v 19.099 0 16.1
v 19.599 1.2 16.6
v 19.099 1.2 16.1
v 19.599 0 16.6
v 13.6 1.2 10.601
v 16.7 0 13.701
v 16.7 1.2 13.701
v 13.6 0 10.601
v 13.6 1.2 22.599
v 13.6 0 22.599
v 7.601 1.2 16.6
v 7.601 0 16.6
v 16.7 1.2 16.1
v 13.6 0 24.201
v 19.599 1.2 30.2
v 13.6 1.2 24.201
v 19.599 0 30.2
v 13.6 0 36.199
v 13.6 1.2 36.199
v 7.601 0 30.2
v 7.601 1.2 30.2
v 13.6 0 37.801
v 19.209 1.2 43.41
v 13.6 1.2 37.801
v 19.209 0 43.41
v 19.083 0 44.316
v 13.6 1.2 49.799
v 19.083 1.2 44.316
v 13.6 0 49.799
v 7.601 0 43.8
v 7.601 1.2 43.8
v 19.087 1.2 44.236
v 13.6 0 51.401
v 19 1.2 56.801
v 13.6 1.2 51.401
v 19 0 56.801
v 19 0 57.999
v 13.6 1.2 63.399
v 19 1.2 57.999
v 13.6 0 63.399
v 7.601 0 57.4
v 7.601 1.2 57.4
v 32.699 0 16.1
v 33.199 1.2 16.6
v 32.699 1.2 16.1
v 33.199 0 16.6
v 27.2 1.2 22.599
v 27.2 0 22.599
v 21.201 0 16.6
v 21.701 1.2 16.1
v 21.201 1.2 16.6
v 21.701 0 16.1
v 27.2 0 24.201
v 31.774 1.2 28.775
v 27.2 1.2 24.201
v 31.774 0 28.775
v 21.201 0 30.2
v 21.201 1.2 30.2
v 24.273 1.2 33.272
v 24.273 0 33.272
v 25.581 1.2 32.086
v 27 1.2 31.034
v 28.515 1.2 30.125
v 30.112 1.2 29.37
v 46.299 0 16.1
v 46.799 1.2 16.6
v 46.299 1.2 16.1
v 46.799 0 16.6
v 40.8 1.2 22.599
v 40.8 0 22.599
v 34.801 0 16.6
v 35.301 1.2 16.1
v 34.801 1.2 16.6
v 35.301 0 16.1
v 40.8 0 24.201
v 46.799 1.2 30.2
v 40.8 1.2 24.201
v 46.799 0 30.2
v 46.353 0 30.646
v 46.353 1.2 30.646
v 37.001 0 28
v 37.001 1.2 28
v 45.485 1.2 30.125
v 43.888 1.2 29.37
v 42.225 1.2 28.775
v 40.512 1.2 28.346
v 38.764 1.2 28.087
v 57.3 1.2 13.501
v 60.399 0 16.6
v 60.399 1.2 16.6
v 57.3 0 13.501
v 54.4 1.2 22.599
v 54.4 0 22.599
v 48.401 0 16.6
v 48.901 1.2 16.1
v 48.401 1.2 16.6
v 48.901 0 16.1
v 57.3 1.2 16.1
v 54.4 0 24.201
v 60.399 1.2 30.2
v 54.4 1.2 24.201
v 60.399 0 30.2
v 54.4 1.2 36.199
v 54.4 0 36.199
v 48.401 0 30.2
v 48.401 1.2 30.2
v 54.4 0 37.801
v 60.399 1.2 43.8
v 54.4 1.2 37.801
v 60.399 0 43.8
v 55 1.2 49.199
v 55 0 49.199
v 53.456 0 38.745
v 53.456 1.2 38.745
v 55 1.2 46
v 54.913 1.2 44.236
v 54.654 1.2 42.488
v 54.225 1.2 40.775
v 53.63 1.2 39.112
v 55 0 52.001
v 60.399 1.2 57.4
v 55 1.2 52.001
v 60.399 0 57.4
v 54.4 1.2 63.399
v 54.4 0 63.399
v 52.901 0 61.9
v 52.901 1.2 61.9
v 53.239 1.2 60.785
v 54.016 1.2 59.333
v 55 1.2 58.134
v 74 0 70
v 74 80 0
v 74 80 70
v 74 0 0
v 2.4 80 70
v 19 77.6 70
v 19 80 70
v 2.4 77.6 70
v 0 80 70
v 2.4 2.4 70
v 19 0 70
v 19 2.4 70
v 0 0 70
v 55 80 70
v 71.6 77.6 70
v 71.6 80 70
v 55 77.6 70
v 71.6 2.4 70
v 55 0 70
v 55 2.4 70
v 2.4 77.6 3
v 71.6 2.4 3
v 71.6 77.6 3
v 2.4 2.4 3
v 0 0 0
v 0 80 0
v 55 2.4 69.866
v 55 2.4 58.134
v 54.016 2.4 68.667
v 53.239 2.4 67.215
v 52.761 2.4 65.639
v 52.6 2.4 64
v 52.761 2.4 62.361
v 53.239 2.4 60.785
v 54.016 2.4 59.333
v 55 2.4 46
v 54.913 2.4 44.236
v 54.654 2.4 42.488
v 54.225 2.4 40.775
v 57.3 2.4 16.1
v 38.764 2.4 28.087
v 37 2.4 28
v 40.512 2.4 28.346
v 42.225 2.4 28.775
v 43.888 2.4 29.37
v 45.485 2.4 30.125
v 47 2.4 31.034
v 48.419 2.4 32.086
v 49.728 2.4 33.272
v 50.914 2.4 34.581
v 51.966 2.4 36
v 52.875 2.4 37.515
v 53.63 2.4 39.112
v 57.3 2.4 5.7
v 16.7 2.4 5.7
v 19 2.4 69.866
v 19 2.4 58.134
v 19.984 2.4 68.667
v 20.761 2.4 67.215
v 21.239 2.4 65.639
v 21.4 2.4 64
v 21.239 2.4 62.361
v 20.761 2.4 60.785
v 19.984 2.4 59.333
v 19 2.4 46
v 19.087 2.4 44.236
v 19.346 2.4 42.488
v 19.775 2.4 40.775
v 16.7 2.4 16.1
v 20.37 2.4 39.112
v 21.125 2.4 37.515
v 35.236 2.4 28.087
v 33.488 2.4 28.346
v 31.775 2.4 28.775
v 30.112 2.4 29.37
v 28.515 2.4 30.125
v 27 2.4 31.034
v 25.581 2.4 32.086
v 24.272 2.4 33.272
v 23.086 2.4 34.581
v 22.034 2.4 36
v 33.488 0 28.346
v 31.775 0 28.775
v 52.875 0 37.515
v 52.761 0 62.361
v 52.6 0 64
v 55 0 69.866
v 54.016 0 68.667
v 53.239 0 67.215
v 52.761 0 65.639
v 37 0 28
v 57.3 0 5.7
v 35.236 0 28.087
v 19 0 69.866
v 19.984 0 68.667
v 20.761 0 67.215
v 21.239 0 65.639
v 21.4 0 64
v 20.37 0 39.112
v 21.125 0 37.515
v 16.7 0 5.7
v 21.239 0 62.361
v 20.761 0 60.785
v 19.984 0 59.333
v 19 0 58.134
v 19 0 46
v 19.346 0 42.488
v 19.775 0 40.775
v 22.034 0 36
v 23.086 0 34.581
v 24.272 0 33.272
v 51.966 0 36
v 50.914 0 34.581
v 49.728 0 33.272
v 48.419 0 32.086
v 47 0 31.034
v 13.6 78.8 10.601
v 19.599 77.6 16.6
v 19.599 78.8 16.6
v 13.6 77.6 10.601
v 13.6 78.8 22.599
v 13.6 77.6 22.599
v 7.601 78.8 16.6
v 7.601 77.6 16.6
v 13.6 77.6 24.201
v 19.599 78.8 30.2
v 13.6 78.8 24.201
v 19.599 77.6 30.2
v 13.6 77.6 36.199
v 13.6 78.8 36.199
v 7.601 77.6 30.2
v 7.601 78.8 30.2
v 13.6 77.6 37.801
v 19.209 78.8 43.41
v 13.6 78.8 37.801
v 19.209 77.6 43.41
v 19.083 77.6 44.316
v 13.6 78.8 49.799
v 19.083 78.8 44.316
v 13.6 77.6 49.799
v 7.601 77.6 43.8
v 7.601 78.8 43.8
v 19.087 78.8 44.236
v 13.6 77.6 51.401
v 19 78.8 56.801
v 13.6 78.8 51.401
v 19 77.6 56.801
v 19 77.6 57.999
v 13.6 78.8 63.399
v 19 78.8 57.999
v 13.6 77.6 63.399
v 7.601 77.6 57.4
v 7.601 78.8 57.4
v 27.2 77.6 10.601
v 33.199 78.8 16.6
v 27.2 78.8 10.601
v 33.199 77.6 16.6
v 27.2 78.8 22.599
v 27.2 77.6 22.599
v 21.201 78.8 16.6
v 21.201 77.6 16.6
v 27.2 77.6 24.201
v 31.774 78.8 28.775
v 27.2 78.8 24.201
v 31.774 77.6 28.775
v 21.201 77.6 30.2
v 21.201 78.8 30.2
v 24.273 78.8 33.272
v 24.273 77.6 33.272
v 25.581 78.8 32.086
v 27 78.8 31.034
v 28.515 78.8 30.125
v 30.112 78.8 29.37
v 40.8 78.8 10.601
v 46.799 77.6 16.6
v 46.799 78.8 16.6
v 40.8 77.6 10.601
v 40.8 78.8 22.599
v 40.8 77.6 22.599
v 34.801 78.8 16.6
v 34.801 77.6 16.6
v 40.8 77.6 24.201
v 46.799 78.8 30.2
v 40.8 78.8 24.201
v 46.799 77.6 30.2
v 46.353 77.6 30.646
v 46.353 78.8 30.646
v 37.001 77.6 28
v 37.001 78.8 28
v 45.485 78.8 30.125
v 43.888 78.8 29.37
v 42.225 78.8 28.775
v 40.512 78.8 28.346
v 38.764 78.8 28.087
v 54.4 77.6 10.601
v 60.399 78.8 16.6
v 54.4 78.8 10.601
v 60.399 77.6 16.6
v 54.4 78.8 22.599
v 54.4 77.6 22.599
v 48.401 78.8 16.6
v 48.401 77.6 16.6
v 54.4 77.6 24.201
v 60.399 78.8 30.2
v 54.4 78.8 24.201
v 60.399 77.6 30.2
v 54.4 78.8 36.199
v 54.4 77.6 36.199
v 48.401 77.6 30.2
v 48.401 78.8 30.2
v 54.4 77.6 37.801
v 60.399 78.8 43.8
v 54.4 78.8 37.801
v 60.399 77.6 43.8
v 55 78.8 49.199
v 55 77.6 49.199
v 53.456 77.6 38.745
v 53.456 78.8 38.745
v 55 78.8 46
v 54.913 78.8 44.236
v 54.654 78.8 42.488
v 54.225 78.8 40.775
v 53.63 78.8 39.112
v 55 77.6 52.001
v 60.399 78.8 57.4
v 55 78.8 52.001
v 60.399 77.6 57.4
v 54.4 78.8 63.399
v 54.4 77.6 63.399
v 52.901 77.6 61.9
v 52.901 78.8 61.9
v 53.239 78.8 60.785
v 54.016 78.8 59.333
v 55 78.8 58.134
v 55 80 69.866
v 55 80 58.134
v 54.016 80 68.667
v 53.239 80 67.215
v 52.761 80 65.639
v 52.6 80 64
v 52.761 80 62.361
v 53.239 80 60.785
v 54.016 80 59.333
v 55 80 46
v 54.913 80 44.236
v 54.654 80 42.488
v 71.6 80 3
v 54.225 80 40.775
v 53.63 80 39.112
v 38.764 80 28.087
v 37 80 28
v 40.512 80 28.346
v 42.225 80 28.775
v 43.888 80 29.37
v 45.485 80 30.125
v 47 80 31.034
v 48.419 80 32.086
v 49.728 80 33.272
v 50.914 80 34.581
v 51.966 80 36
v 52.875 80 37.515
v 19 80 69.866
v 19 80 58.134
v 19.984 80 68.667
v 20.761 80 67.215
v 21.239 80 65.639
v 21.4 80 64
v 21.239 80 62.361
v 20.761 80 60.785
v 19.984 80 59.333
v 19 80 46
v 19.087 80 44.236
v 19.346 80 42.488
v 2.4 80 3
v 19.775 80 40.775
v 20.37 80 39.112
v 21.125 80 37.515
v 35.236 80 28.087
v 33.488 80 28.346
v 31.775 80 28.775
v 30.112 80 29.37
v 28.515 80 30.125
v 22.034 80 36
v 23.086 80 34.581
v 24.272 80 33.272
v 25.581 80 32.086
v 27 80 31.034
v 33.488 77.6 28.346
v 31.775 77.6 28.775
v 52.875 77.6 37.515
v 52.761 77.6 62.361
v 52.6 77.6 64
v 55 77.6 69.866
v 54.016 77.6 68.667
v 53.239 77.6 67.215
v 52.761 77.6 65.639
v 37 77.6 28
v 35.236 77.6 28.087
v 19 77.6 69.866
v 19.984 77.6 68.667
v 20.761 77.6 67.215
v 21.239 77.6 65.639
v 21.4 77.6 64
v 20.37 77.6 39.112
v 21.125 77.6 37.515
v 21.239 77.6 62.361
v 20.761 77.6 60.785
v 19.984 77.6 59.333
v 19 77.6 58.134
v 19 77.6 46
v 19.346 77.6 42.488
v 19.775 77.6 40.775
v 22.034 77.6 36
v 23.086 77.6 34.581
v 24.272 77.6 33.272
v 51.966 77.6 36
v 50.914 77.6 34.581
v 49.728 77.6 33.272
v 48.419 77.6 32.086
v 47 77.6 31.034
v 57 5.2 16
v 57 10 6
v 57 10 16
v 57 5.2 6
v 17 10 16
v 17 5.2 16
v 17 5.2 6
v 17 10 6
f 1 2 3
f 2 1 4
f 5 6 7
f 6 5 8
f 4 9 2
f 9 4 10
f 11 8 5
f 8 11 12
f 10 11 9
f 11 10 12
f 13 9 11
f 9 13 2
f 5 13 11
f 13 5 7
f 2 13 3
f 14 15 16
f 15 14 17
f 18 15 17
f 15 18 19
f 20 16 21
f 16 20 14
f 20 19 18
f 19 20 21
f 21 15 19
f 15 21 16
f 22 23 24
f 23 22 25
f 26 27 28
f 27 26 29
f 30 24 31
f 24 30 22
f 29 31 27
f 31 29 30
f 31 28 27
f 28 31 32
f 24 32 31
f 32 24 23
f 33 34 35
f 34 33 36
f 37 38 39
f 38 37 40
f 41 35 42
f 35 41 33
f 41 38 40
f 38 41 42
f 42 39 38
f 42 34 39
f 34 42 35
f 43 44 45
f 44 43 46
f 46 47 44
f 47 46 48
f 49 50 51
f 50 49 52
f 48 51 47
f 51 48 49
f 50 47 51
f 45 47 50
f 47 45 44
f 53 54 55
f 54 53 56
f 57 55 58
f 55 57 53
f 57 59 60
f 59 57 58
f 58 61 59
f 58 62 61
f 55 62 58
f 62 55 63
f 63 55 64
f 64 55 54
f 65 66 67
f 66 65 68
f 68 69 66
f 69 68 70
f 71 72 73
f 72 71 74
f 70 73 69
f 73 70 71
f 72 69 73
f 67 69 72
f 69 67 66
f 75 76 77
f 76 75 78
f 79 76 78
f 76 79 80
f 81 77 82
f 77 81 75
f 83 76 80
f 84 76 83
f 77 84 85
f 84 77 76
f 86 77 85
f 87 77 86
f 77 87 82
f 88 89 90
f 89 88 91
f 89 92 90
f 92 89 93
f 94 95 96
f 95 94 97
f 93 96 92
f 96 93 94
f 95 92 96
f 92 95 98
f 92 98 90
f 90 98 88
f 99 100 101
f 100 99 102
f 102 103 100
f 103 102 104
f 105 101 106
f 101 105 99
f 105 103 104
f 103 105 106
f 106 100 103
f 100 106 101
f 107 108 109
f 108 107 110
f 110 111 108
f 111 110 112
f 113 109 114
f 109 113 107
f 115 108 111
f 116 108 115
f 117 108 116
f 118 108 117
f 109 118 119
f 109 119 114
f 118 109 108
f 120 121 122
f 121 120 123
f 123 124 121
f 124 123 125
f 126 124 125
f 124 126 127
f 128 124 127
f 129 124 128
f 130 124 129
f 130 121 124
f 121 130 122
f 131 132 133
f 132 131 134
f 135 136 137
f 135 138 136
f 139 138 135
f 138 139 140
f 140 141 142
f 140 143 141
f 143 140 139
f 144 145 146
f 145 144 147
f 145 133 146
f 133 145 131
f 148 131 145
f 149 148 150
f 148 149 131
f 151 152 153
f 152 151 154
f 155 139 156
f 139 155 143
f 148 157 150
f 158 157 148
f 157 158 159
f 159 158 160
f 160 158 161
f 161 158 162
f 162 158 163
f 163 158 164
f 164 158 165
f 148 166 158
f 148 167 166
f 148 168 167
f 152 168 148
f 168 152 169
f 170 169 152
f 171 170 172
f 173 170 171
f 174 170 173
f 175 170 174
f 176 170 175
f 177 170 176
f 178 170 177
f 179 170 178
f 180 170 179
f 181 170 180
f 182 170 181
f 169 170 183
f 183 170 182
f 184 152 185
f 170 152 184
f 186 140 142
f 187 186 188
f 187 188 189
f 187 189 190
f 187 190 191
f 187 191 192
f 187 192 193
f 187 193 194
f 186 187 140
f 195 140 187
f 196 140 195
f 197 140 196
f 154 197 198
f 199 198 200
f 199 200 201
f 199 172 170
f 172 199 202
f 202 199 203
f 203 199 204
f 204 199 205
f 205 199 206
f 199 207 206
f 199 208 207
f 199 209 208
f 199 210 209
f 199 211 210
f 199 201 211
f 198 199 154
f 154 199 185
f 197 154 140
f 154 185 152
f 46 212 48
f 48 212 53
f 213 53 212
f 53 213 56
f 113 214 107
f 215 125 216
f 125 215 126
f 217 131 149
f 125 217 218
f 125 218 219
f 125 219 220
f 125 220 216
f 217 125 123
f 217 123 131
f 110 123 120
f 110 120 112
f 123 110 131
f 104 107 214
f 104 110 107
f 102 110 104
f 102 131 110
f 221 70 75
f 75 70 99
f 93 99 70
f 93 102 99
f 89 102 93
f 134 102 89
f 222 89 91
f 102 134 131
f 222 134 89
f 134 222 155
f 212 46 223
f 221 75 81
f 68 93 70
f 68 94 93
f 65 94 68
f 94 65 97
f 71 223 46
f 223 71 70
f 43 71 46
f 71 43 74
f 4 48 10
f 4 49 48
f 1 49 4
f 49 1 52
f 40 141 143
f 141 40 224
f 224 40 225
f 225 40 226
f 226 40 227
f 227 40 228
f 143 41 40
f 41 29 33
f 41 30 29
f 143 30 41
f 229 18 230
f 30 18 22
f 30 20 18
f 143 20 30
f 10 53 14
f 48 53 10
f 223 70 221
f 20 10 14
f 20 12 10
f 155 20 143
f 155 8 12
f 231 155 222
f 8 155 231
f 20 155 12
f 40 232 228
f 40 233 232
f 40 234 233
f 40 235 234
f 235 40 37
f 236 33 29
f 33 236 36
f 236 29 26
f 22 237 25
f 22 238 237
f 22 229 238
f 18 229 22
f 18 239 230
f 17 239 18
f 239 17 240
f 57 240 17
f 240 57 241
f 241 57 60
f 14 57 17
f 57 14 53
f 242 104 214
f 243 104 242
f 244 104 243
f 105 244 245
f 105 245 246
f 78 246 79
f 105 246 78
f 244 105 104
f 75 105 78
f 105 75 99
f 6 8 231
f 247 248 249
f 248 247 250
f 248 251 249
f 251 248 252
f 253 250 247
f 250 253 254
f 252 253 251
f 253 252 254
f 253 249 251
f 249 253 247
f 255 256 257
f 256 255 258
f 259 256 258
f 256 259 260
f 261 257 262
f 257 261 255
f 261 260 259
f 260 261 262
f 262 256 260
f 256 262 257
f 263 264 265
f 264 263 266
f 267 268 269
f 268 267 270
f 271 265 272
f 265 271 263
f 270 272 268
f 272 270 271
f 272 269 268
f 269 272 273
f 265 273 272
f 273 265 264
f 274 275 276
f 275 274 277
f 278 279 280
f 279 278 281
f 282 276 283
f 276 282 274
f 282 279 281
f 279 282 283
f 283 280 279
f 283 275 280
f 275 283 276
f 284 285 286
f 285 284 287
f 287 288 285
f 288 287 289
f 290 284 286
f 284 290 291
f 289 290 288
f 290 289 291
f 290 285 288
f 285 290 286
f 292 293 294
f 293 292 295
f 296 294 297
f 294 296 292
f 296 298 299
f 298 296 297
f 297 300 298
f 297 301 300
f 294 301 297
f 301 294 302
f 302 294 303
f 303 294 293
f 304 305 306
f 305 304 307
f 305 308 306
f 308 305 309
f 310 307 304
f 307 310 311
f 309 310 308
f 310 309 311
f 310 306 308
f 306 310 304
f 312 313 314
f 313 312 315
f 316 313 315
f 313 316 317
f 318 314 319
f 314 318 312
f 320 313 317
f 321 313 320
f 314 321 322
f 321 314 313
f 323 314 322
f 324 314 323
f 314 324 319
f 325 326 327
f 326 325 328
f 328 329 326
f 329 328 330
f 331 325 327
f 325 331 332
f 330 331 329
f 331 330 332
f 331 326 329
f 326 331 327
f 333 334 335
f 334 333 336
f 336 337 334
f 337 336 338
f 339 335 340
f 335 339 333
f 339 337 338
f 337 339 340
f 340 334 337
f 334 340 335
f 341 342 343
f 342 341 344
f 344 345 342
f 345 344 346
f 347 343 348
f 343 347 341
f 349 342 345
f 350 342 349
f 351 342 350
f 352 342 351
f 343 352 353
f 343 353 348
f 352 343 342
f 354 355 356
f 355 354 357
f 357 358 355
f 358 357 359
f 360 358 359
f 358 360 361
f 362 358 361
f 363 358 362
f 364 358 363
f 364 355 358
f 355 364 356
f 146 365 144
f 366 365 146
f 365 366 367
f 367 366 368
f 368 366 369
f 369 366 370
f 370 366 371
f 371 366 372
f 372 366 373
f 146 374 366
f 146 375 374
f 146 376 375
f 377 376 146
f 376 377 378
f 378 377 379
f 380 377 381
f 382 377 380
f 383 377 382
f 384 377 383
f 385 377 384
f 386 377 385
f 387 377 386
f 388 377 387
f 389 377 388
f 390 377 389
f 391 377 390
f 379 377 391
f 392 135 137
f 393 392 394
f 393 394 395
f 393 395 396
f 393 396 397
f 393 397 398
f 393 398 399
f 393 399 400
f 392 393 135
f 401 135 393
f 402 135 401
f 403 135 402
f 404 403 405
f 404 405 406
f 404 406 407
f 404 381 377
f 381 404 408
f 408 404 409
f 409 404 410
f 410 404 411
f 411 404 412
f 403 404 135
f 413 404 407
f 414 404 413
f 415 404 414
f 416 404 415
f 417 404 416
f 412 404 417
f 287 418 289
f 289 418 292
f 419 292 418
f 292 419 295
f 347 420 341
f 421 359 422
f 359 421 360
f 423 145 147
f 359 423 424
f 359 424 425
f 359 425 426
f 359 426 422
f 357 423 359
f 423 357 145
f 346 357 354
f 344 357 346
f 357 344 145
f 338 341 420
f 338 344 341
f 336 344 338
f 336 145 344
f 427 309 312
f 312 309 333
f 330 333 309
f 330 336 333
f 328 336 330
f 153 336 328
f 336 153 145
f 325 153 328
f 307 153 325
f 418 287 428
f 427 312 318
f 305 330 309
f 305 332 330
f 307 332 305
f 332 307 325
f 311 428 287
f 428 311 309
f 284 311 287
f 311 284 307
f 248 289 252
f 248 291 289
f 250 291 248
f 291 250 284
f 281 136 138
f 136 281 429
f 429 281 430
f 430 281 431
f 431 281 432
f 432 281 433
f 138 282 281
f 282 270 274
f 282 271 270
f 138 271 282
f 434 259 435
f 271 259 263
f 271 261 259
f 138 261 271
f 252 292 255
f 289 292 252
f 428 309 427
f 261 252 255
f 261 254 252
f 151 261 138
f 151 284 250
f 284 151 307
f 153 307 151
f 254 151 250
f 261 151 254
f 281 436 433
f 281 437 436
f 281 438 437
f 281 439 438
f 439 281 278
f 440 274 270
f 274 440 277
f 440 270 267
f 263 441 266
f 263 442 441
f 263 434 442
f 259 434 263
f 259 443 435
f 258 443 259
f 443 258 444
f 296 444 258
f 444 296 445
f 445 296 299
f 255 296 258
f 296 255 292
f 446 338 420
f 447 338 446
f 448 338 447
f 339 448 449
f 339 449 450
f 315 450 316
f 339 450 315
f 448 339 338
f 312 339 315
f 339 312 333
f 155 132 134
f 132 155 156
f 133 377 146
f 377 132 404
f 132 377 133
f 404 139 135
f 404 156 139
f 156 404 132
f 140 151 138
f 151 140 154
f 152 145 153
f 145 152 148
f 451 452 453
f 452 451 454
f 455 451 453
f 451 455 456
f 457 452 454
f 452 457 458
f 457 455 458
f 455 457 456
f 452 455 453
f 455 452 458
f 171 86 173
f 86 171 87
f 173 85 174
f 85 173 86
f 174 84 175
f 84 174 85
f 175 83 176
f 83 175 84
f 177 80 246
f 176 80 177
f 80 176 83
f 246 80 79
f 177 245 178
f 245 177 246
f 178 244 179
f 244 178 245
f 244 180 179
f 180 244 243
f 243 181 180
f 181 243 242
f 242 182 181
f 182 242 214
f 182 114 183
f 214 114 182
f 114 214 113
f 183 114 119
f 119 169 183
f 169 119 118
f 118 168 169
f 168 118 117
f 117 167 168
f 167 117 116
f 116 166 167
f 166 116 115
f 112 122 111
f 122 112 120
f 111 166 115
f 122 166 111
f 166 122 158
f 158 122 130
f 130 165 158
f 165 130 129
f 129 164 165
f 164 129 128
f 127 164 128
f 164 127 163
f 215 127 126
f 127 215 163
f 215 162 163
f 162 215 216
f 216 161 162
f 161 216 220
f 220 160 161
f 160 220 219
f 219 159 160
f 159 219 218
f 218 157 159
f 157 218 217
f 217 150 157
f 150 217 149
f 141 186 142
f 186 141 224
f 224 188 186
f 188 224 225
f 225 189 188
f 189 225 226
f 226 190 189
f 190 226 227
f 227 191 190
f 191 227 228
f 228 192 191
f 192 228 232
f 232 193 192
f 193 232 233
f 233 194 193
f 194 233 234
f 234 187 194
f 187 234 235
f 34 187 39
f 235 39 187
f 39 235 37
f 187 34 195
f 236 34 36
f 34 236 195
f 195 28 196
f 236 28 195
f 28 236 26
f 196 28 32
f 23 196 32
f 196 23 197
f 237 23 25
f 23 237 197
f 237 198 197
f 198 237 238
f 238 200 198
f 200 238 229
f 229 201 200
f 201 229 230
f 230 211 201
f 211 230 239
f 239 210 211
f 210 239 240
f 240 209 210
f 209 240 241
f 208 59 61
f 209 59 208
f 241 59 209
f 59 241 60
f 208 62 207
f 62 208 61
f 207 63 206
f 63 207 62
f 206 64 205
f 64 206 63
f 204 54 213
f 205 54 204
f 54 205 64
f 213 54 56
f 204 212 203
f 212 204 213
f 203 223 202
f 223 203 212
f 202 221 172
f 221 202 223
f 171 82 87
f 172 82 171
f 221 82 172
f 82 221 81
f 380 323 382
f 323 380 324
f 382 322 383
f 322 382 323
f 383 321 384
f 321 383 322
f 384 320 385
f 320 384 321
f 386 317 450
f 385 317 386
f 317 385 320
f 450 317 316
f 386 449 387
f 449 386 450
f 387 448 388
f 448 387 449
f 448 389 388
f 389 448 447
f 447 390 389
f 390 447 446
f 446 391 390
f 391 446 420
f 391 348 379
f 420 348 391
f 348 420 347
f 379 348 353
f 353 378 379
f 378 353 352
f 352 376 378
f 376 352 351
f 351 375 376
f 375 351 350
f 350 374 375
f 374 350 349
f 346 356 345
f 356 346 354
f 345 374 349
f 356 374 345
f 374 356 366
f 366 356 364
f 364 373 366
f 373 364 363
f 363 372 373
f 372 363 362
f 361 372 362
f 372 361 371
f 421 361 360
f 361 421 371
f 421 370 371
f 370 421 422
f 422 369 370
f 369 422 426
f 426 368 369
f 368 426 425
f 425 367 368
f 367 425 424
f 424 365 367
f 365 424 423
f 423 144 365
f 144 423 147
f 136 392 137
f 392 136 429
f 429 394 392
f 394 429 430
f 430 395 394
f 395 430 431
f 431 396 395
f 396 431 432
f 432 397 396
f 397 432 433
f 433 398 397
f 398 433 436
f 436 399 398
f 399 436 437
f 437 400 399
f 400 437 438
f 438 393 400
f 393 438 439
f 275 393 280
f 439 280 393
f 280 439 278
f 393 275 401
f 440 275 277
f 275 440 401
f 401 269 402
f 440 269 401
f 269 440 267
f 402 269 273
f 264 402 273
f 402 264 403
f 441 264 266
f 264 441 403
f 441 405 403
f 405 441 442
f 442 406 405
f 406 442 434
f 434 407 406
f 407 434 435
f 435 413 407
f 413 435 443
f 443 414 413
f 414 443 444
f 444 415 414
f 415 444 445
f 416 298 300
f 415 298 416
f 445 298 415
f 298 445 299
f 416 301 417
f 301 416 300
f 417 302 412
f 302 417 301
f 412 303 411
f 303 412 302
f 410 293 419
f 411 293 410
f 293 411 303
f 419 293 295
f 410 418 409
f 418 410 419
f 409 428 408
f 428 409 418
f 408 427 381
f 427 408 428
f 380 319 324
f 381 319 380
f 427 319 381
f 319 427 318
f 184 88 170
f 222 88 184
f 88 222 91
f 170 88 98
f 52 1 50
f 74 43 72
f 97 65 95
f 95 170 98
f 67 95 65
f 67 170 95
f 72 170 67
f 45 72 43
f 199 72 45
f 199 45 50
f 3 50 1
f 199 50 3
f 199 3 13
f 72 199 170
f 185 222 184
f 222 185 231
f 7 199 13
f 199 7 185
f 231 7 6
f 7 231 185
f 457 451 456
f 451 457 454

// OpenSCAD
// ============================================================
//  joint_test.scad — 1-cell prototype, lattice front/back
//  Print TWO: joint_test.scad (front) + joint_back.scad (back)
//  Each ~45 min, print together on same bed
// ============================================================

cw   = 74;
cd   = 80;
wh   = 70;
ow   = 2.4;
bt   = 3.0;
tt   = 5;
tl   = 40;
th   = 10;
tol  = 0.3;
lat_gap    = 12;
lat_strand = 1.6;
uc_w = 36;
uc_r = 18;
uc_dep = 42;
tc_r = 6;
tx = cw / 2;

// Lattice wall running along X
module lat_wall_x(len, ht, thick, gap, strand) {
    pitch = gap + strand;
    difference() {
        cube([len, thick, ht]);
        for (xi=[pitch:pitch:len-pitch/2], zi=[pitch:pitch:ht-pitch/2])
            translate([xi,-0.1,zi]) rotate([0,45,0])
                cube([gap*0.707,thick+0.2,gap*0.707],center=true);
    }
}

module u_profile_2d() {
    half = uc_w/2;
    difference() {
        union() {
            translate([-half, uc_r]) square([uc_w, uc_dep-uc_r]);
            translate([0, uc_r]) circle(r=uc_r, $fn=64);
        }
        translate([-half-tc_r, uc_dep-tc_r]) circle(r=tc_r*1.4, $fn=32);
        translate([ half+tc_r, uc_dep-tc_r]) circle(r=tc_r*1.4, $fn=32);
    }
}

module u_cut(wt) {
    translate([0, wt, wh-uc_dep])
        rotate([90,0,0])
            linear_extrude(wt+0.2)
                u_profile_2d();
}

module test_piece(is_front=false) {
    difference() {
        union() {
            // Base
            cube([cw, cd, bt]);
            // Front wall — lattice
            translate([0, 0, bt])
                lat_wall_x(cw, wh-bt, ow, lat_gap, lat_strand);
            // Back wall — lattice
            translate([0, cd-ow, bt])
                lat_wall_x(cw, wh-bt, ow, lat_gap, lat_strand);
            // Left wall — solid
            translate([0, 0, bt]) cube([ow, cd, wh-bt]);
            // Right wall — solid
            translate([cw-ow, 0, bt]) cube([ow, cd, wh-bt]);

            // Tongue or receiver block
            if (is_front)
                translate([tx-tl/2, cd, bt+3]) cube([tl, tt, th]);
            else
                translate([tx-tl/2, 0, bt+3]) cube([tl, tt*2, th]);
        }

        // U cutouts
        translate([cw/2, 0, 0])    u_cut(ow);
        translate([cw/2, cd-ow, 0]) u_cut(ow);

        // Groove pocket on back piece
        if (!is_front)
            translate([tx-tl/2-tol, -0.1, bt+3-tol])
                cube([tl+tol*2, tt+tol, th+tol+0.1]);
    }
}

test_piece(is_front=false);
// For back piece: change to test_piece(is_front=false);
